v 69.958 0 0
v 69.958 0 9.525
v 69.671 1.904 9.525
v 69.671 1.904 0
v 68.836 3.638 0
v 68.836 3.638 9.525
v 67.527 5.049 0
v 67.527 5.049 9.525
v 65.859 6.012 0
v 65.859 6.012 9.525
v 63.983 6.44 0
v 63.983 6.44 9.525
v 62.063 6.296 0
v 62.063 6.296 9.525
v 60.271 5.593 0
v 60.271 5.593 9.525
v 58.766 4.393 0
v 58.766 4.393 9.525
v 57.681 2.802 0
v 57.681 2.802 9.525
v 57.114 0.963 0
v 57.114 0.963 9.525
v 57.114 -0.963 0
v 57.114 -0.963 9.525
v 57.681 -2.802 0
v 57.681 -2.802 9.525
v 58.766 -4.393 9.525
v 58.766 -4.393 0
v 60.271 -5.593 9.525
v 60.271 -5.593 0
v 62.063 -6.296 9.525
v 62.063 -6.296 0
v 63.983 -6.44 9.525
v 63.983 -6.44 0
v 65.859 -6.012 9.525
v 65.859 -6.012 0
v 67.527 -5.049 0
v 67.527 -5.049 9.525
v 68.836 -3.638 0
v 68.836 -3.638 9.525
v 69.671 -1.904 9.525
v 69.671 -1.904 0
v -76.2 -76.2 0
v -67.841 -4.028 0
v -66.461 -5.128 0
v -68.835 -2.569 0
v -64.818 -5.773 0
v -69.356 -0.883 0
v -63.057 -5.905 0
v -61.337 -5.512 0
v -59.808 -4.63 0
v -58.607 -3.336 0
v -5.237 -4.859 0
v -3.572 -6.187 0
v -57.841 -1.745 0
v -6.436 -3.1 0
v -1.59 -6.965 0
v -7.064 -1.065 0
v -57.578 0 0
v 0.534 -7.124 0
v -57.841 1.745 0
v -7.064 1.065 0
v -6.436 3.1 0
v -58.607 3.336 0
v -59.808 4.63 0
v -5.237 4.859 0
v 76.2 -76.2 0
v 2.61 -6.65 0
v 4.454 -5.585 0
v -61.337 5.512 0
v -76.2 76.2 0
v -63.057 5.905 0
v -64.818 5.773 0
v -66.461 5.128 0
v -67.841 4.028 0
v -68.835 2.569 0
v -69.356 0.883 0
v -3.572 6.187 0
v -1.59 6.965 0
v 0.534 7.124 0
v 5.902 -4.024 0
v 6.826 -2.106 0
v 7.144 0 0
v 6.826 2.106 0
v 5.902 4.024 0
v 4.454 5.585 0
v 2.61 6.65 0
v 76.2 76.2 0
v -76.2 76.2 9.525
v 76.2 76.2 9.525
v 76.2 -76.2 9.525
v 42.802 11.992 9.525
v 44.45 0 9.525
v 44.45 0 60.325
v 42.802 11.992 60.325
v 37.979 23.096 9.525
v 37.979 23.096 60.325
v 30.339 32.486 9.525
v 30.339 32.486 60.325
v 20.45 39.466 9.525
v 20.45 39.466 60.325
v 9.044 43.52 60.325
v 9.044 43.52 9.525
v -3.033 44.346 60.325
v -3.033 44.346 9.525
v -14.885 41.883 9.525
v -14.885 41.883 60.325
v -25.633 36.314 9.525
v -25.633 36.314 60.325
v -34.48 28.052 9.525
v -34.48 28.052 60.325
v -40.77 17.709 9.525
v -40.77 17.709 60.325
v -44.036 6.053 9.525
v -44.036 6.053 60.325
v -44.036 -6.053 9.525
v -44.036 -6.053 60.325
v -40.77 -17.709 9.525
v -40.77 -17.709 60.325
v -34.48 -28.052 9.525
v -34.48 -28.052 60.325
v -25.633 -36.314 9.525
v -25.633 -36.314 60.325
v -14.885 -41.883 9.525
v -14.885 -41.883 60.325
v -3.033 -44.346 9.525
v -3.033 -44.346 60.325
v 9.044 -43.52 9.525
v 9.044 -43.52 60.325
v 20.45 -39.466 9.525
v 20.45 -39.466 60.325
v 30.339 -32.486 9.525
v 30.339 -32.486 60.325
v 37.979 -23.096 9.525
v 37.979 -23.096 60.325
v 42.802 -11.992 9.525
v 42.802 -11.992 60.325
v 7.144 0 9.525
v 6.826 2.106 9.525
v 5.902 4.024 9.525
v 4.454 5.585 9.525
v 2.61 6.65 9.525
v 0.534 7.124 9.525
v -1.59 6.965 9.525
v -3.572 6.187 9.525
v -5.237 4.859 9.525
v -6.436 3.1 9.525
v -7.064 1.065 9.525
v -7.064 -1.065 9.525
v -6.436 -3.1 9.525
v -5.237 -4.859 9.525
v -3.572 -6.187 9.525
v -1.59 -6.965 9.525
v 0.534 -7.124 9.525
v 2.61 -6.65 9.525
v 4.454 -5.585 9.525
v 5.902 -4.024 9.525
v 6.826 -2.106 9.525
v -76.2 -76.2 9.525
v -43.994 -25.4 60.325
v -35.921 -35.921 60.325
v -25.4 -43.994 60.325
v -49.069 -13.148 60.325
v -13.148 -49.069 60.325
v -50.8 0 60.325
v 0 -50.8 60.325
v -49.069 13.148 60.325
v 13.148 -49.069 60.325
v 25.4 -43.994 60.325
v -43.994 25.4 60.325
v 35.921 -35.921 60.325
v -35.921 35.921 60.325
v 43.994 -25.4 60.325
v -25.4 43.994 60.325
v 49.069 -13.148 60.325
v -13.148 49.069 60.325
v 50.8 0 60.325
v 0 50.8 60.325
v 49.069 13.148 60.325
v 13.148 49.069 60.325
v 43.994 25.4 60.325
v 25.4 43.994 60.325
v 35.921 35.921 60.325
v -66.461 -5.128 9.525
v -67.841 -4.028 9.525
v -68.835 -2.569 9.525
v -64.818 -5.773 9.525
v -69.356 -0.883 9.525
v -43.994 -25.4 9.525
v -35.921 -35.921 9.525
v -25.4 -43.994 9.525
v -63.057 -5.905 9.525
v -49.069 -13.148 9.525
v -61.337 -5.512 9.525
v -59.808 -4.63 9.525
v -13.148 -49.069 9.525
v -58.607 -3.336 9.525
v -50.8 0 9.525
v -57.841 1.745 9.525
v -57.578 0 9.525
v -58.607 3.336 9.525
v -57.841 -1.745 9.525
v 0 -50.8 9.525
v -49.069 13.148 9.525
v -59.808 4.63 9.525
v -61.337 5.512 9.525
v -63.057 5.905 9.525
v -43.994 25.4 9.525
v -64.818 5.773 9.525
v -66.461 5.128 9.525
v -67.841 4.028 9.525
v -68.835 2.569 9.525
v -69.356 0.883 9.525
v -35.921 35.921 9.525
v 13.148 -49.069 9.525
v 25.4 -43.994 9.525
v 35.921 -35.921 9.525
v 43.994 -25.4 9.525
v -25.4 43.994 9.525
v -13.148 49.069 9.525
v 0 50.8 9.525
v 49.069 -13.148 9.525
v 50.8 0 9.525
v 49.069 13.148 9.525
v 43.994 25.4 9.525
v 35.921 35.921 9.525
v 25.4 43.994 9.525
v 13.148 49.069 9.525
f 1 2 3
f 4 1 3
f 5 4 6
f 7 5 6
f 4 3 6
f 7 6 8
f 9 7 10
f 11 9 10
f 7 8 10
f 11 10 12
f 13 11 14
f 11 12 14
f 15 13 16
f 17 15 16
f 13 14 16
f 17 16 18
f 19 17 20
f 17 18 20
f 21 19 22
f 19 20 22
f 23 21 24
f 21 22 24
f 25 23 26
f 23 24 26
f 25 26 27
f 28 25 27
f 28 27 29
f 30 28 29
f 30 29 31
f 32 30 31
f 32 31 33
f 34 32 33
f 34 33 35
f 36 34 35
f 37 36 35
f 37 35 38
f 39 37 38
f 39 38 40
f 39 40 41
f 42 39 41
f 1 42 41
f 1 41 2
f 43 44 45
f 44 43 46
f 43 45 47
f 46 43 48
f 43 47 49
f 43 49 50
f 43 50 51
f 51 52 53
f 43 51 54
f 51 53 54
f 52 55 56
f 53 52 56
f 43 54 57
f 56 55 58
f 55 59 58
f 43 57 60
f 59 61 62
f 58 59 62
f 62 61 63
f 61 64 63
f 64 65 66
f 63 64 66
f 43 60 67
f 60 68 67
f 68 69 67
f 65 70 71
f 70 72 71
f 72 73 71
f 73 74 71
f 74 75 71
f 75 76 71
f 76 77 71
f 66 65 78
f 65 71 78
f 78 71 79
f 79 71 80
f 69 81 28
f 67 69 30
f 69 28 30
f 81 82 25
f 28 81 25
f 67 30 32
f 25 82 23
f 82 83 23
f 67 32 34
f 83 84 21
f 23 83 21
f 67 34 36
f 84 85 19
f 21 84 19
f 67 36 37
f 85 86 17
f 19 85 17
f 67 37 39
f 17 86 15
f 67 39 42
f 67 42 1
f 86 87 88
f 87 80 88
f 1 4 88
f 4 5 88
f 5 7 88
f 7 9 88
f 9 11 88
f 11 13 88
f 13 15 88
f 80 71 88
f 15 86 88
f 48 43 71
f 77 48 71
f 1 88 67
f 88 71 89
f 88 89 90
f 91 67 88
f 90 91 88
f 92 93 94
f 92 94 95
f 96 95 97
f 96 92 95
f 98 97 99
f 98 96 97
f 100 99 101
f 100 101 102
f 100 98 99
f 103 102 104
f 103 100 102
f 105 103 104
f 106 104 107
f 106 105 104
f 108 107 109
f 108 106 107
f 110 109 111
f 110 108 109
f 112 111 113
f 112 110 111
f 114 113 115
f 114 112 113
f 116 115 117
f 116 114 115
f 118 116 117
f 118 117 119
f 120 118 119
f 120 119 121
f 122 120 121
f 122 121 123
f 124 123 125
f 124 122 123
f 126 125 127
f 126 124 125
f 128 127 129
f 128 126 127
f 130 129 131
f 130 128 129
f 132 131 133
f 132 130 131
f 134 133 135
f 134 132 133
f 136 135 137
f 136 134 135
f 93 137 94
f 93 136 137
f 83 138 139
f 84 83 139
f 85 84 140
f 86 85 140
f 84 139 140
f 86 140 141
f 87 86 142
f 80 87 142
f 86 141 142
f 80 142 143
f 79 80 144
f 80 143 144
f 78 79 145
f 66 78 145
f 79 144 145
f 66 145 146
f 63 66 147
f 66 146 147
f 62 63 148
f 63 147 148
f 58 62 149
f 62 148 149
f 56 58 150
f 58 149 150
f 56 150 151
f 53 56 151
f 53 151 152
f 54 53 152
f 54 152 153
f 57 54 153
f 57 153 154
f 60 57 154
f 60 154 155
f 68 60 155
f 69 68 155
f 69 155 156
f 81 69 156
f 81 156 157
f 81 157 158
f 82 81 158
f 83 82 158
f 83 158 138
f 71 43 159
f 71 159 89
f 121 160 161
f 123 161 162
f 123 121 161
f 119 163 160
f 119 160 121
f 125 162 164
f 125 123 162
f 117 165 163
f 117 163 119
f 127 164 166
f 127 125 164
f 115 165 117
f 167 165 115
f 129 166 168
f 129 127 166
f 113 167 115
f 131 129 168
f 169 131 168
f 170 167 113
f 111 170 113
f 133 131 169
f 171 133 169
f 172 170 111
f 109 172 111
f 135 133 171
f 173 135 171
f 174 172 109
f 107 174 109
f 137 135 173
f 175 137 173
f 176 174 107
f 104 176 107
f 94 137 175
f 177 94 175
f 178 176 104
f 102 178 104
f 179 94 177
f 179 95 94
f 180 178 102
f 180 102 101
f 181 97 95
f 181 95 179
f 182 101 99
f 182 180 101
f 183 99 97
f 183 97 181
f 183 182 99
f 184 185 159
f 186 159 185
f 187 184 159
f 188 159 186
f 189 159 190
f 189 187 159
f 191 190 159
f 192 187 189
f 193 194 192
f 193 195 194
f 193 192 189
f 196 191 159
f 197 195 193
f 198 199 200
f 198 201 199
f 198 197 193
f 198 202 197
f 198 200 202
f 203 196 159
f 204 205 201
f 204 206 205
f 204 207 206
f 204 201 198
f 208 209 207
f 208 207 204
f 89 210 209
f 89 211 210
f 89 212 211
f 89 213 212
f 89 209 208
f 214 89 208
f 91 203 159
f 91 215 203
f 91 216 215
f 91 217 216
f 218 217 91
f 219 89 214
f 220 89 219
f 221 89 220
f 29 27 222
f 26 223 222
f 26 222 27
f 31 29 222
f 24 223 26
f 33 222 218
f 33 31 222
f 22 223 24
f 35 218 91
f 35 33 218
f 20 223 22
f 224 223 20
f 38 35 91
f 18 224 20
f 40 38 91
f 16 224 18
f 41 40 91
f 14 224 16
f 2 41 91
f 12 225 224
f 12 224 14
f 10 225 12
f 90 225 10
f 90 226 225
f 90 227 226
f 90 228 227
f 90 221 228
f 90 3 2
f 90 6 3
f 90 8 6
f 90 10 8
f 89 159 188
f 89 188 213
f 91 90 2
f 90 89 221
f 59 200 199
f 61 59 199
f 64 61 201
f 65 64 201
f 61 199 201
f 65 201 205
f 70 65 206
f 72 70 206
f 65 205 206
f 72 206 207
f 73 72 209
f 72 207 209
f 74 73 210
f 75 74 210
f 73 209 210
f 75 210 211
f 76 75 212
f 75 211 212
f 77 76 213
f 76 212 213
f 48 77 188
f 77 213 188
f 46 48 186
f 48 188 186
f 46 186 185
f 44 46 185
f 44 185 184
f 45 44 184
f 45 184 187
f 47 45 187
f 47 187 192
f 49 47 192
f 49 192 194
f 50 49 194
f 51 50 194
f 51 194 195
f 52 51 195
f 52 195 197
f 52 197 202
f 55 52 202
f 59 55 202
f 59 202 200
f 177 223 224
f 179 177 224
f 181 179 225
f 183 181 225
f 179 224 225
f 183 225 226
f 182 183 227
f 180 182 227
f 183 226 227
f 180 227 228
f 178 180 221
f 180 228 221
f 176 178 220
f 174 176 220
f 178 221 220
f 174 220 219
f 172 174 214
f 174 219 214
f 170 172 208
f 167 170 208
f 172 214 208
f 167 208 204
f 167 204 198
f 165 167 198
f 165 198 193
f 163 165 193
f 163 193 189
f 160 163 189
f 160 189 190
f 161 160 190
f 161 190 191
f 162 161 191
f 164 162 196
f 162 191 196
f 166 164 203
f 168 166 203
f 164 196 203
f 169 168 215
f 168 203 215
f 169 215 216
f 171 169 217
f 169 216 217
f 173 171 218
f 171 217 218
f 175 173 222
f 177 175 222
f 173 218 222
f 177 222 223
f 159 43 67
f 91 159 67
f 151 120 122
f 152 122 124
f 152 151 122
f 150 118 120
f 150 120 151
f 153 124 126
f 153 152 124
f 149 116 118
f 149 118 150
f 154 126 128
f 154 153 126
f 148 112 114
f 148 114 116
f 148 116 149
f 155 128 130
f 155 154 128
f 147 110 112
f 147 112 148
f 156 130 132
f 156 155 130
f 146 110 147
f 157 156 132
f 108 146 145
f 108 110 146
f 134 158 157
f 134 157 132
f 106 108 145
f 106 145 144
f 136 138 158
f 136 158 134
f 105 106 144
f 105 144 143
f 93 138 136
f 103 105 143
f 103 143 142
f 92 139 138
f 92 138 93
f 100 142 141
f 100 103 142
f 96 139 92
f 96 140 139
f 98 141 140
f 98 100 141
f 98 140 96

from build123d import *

# Parameters (mm, degrees)
F0_W     = 152.4
F0_H     = 152.4
F1_DEPTH = 9.525
F2_R     = 50.8
F2_R_2   = 44.45
F3_DEPTH = 50.8
F4_R     = 7.14375
F5_DEPTH = 25.4
F6_R     = 6.458156
F6_R_2   = 5.921704
F7_DEPTH = 25.4


with BuildPart() as f1:
    # F0 (on Top) → F1 (new body)
    with BuildSketch(Plane.XY):
        Rectangle(F0_W, F0_H)
    extrude(amount=F1_DEPTH)

    # F2 (on face) → F3 (join)
    with BuildSketch(Plane.XY.offset(9.525)):
        Circle(F2_R)
        Circle(F2_R_2, mode=Mode.SUBTRACT)
    extrude(amount=F3_DEPTH)

    # F4 (on face) → F5 (cut)
    with BuildSketch(Plane.XY.offset(9.525)):
        Circle(F4_R)
    extrude(amount=-F5_DEPTH, mode=Mode.SUBTRACT)

    # F6 (on face) → F7 (cut)
    with BuildSketch(Plane.XY.offset(9.525)):
        with Locations((63.5, 0)):
            Circle(F6_R)
        with Locations((-63.5, 0)):
            Circle(F6_R_2)
    extrude(amount=-F7_DEPTH, mode=Mode.SUBTRACT)


solid = f1.part
